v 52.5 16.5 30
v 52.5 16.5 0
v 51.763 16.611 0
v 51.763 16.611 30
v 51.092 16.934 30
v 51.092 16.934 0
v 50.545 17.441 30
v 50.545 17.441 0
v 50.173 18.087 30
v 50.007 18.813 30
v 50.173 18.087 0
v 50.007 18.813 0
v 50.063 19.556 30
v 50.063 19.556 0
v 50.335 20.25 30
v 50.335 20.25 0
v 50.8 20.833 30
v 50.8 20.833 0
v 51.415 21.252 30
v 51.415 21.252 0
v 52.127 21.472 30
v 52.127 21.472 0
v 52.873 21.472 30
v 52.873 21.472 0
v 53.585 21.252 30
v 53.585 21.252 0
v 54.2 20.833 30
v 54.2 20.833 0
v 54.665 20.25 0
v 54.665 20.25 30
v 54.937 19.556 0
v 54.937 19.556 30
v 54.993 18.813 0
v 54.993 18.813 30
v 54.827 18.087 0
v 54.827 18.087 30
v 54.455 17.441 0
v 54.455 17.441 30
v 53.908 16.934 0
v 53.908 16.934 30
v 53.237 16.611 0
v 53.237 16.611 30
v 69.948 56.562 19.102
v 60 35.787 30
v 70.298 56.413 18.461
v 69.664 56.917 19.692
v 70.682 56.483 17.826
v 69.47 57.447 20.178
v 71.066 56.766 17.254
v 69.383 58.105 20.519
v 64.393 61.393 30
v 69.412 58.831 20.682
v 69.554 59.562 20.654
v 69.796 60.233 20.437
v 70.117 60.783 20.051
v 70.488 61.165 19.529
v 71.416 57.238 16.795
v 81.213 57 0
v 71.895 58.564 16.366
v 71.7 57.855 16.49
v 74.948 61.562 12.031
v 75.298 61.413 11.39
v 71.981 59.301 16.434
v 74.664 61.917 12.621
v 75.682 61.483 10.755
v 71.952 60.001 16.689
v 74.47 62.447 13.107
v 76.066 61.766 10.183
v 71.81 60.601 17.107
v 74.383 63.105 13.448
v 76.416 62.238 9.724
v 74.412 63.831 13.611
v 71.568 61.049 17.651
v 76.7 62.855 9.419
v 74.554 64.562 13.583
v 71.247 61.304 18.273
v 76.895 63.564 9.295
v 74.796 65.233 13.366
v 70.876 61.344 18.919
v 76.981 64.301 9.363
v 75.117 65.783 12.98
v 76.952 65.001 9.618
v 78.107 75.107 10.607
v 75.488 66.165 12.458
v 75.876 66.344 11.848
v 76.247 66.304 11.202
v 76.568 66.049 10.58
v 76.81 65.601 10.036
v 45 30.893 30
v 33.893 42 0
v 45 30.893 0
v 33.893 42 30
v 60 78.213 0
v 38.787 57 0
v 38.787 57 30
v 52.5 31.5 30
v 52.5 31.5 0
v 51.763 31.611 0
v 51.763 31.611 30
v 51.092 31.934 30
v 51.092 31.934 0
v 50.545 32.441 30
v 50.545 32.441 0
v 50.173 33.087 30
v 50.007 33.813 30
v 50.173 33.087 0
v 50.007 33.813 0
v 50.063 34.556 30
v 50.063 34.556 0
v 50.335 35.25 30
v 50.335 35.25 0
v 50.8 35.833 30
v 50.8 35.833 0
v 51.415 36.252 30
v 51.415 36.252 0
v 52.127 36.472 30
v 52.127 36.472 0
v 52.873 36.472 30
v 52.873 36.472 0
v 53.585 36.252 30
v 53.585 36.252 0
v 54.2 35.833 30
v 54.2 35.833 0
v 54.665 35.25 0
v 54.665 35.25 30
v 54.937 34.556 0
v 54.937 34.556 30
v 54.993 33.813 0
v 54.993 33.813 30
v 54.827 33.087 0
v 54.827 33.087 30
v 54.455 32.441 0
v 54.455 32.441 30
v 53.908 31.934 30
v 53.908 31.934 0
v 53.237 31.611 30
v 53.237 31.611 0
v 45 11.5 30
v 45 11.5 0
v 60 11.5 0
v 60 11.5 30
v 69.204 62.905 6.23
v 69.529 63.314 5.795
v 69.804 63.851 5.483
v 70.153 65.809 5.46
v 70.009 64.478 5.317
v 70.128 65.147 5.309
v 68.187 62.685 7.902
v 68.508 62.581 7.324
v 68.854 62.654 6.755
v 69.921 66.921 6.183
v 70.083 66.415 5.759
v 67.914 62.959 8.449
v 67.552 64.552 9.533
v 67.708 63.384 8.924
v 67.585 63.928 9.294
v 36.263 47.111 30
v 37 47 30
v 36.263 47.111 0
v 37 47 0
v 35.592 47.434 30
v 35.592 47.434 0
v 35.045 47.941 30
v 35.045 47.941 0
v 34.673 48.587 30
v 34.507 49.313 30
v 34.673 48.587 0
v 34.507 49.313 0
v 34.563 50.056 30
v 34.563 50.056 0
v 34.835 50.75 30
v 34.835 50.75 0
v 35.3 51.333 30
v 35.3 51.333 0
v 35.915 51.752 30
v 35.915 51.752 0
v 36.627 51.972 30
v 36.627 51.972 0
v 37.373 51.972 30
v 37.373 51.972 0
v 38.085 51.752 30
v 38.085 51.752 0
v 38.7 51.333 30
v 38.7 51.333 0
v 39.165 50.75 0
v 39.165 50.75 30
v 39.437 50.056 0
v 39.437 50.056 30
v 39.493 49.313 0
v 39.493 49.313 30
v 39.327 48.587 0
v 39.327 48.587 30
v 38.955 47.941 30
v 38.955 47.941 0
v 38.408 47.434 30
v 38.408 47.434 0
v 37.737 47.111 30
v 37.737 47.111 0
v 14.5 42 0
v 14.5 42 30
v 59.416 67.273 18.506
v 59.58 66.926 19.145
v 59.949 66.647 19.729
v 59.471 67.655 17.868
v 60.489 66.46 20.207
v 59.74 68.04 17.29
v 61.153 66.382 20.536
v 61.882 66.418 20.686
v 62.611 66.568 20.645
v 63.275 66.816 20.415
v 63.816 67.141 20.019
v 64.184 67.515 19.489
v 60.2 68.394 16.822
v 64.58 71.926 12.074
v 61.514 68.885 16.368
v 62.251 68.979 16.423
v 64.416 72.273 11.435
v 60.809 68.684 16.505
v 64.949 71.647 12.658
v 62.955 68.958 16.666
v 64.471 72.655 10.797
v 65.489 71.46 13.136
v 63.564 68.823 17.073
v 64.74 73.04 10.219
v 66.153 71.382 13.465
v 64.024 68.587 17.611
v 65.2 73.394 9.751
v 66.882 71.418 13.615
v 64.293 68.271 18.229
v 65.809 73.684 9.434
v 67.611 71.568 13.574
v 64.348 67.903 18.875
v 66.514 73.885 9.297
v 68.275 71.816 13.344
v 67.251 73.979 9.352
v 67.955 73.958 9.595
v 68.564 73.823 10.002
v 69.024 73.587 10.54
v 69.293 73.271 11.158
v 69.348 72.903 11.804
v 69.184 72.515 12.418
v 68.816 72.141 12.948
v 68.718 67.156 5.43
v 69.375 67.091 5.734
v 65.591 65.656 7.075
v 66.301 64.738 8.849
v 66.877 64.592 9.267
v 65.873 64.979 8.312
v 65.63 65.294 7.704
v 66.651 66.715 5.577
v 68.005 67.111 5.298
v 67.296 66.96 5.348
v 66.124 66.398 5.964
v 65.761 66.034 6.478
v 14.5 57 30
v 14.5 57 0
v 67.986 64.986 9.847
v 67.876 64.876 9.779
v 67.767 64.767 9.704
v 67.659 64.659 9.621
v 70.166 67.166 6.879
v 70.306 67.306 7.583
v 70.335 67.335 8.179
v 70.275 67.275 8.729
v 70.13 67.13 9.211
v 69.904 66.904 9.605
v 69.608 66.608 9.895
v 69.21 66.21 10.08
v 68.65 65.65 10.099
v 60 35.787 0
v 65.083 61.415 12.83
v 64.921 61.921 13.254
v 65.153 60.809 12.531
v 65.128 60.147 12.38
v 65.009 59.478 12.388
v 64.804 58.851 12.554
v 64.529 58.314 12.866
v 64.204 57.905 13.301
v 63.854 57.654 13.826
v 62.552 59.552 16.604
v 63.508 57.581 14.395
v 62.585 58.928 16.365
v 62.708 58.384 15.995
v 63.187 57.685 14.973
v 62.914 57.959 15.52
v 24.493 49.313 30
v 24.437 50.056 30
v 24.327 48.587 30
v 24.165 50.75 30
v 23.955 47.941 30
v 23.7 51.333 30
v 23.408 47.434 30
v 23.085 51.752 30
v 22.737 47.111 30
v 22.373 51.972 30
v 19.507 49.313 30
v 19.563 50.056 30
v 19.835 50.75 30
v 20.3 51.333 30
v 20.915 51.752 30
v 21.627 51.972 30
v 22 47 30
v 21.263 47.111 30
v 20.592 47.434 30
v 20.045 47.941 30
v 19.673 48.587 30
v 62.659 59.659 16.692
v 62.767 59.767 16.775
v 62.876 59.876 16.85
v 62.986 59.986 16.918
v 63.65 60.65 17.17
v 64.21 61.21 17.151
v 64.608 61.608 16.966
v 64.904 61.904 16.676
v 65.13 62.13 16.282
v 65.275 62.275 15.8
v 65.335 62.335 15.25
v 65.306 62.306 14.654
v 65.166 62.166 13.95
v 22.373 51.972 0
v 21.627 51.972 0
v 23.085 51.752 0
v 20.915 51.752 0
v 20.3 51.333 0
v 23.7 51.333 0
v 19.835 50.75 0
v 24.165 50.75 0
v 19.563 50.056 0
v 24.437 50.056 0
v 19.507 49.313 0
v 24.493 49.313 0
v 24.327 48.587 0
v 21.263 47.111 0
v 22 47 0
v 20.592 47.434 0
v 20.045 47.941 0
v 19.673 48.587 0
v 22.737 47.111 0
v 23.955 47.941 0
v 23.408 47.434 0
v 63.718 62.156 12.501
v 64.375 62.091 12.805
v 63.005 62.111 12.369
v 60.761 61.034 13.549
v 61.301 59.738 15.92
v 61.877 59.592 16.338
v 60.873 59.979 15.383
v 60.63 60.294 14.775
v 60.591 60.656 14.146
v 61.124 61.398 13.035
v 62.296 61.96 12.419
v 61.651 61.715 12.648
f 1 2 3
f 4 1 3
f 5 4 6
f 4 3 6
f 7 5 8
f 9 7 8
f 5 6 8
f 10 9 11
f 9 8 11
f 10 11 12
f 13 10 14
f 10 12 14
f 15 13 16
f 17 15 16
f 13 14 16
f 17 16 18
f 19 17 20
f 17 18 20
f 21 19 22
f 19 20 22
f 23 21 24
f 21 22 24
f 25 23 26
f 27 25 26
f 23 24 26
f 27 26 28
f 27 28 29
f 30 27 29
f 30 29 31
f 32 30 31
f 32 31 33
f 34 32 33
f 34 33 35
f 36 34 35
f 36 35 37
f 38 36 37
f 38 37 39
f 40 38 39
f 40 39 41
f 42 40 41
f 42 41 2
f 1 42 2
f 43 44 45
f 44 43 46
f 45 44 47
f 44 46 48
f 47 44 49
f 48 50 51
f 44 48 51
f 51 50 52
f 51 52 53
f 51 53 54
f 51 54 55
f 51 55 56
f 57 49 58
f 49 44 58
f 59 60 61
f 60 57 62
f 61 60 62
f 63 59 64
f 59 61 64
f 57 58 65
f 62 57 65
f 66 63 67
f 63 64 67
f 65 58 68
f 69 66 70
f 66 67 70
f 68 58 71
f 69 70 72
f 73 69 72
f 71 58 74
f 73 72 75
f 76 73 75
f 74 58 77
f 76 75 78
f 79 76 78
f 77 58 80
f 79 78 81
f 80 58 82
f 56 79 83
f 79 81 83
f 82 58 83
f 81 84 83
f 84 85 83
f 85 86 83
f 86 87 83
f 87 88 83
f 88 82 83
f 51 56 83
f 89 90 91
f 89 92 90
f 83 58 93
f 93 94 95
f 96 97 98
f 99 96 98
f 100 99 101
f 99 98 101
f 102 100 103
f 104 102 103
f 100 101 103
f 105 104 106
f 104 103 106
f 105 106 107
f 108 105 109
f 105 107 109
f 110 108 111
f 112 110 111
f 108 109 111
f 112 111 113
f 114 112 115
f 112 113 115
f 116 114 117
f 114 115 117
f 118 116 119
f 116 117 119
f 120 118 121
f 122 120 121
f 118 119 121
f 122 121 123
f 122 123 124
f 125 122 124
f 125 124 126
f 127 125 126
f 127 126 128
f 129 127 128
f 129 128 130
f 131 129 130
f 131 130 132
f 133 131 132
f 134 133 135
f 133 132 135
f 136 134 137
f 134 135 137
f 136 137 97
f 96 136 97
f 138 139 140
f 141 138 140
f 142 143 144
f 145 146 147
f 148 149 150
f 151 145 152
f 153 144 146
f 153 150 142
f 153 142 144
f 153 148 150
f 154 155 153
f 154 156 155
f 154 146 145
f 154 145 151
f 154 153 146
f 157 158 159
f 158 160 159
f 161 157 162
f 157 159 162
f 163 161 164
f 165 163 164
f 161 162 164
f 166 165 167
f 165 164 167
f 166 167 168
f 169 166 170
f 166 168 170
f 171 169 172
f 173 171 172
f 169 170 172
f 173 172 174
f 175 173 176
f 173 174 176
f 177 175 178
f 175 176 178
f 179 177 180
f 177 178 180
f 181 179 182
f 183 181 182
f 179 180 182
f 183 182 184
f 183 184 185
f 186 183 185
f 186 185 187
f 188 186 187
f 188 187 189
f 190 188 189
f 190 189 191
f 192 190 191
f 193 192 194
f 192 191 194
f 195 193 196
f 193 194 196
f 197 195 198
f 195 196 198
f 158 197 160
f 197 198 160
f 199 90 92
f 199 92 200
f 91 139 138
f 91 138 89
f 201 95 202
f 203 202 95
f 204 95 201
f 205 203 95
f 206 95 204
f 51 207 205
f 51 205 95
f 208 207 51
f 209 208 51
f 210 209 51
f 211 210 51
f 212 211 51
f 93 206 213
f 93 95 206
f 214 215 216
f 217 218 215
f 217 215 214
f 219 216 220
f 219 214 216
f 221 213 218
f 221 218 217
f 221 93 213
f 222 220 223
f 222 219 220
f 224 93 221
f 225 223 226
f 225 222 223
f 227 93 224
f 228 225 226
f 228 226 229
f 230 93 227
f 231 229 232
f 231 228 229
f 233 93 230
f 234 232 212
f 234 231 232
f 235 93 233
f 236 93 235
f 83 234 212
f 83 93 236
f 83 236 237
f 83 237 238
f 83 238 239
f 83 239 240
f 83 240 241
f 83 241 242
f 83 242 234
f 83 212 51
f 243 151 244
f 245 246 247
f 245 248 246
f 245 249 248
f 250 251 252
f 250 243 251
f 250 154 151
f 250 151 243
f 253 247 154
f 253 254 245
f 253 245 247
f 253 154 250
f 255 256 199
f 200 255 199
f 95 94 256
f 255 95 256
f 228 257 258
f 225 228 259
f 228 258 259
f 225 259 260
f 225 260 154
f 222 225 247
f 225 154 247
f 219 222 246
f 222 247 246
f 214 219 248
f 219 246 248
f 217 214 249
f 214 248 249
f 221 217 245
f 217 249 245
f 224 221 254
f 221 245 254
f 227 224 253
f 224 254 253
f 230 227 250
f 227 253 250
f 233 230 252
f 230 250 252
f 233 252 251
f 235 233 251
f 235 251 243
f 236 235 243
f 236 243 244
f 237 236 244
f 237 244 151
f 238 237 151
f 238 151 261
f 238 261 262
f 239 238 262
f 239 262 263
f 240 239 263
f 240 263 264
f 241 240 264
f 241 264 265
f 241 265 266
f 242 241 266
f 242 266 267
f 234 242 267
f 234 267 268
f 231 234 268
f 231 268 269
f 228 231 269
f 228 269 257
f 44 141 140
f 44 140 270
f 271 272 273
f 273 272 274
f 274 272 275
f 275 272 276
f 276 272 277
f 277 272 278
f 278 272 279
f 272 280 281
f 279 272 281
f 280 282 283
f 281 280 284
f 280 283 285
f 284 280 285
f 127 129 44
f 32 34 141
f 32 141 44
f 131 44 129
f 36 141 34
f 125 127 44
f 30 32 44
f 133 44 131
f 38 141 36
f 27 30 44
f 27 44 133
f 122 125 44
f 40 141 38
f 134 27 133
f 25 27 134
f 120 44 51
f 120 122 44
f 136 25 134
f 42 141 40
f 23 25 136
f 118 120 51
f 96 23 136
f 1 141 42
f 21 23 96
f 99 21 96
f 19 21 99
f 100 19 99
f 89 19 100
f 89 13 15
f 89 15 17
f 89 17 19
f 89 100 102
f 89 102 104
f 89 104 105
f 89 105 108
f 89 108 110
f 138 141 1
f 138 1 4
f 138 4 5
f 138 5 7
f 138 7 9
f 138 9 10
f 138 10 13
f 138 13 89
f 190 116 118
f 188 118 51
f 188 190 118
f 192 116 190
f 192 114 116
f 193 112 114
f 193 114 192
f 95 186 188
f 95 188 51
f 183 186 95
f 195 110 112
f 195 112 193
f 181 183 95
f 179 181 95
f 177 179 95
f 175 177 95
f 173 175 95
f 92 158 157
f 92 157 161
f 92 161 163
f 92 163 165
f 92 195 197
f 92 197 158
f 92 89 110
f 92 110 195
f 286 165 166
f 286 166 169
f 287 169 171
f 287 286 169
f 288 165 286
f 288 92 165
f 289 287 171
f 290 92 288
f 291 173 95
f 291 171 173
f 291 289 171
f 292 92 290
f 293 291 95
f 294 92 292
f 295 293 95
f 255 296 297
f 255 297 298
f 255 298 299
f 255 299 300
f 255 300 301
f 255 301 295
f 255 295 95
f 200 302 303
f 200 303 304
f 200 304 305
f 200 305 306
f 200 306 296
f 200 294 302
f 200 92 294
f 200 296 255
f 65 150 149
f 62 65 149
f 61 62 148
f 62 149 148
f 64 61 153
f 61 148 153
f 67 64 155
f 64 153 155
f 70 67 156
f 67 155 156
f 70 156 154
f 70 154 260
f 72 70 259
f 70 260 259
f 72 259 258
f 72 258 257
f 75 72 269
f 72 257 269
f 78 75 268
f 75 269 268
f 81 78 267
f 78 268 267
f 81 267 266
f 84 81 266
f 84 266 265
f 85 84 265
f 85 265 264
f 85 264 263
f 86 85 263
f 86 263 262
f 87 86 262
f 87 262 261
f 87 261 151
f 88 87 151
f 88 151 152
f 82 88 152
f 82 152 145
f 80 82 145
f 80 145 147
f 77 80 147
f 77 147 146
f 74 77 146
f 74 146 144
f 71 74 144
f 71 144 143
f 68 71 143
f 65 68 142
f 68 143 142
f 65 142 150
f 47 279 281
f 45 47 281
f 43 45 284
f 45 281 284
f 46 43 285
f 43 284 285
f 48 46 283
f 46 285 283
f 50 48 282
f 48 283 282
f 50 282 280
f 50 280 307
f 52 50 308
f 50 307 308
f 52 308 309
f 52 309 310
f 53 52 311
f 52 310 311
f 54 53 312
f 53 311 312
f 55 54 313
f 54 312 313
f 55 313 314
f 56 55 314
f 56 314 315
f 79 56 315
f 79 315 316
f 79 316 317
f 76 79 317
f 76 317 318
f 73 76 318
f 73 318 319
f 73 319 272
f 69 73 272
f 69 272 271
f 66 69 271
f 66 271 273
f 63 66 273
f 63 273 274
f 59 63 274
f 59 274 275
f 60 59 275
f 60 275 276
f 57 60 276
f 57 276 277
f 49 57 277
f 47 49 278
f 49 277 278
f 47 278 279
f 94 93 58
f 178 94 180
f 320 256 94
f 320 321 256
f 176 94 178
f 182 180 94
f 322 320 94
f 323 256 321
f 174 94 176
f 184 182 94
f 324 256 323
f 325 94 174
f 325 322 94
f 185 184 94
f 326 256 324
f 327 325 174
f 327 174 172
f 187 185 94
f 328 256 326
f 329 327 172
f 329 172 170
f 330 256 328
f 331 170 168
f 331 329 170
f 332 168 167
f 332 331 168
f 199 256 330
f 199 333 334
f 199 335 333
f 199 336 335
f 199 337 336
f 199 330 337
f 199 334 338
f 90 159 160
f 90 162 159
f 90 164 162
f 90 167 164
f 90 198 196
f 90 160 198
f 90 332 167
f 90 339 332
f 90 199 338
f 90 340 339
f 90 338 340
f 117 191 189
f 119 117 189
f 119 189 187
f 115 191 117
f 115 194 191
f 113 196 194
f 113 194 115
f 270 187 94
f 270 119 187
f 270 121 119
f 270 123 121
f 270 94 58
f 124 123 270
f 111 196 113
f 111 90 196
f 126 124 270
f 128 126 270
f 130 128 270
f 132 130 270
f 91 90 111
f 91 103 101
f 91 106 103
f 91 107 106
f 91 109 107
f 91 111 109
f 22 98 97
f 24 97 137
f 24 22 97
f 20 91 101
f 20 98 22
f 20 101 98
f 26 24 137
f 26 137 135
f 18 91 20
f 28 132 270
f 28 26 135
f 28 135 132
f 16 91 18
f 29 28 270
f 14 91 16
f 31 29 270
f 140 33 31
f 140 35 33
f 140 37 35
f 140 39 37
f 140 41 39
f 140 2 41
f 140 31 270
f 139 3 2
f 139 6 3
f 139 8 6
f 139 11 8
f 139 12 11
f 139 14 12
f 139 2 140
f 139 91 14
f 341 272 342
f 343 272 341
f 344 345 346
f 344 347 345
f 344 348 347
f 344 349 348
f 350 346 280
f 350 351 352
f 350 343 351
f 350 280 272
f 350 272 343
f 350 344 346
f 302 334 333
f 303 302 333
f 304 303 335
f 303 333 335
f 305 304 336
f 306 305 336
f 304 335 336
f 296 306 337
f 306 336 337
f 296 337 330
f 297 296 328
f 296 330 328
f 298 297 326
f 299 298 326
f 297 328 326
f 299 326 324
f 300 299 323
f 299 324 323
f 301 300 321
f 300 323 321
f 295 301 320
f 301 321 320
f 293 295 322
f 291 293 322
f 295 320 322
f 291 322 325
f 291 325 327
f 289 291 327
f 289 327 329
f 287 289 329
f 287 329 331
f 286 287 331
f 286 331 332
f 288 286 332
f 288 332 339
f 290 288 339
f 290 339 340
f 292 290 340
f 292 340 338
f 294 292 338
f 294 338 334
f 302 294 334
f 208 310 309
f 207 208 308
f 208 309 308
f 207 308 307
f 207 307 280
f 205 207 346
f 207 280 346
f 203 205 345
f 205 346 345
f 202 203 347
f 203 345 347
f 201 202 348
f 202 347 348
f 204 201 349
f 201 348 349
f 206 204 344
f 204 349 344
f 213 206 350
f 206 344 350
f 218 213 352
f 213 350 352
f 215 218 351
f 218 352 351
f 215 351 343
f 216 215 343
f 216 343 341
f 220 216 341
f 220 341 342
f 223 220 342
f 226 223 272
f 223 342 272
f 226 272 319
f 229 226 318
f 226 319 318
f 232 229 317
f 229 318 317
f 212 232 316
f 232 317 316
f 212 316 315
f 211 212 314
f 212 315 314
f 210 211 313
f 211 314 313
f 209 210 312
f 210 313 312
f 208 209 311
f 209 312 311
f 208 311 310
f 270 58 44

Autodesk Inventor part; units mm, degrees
ref_plane "YZ Plane" through (0, 0, 0) normal (1, 0, 0) x (0, 1, 0)
ref_plane "XZ Plane" through (0, 0, 0) normal (0, 1, 0) x (-1, 0, 0)
ref_plane "XY Plane" through (0, 0, 0) normal (0, 0, 1) x (1, 0, 0)
sketch "スケッチ1" plane through (0, 0, 0) normal (0, 0, 1) x (1, 0, 0)
  line L0 (0, 0) -> (60, 0)
  line L1 (60, 0) -> (60, 60)
  line L2 (60, 60) -> (0, 60)
  line L3 (0, 60) -> (0, 0)
  dimension "d0" = 60
  dimension "d1" = 60
extrude "押し出し1" add sketch "スケッチ1" along normal blind 30
sketch "スケッチ2" plane through (0, 0, 30) normal (0, 0, 1) x (1, 0, 0)
  line L0 (60, 0) -> (60, 60) projected
  line L1 (60, 60) -> (0, 60) projected
  point P0 (0, 0)
  point P1 (22, 49.5)
  point P2 (37, 49.5)
  point P3 (52.5, 34)
  point P4 (52.5, 19)
  dimension "d4" = 7.5
  dimension "d5" = 7.5
  dimension "d6" = 10.5
  dimension "d7" = 10.5
  dimension "d8" = 15
  dimension "d9" = 15
  dimension "d10" = 23
  dimension "d11" = 26
hole "穴1" at (22, 49.5, 30) at (37, 49.5, 30) at (52.5, 34, 30) at (52.5, 19, 30) direction (0, 0, -1) diameter 5 end through all
sketch "スケッチ3" plane through (0, 0, 30) normal (0, 0, 1) x (1, 0, 0)
  line L0 (22, 49.5) -> (37, 49.5)
  circle A0 centre (52.5, 34) radius 2.5 projected
  line L1 (37, 49.5) -> (52.5, 34)
  line L2 (52.5, 34) -> (52.5, 19)
  line L3 (22, 49.5) -> (22, 19)
  line L4 (22, 19) -> (52.5, 19)
  line L5 (60, 37.1066) -> (40.1066, 57)
  line L6 (40.1066, 57) -> (14.5, 57)
  line L7 (14.5, 57) -> (14.5, 11.5)
  line L8 (14.5, 11.5) -> (60, 11.5)
  line L9 (60, 11.5) -> (60, 37.1066)
  line L10 (14.5, 57) -> (44.5, 57)
  line L11 (44.5, 57) -> (44.5, 42)
  line L12 (44.5, 42) -> (14.5, 42)
  line L13 (14.5, 42) -> (14.5, 57)
  line L14 (60, 11.5) -> (45, 11.5)
  line L15 (45, 11.5) -> (45, 41.5)
  line L16 (45, 41.5) -> (60, 41.5)
  line L17 (60, 41.5) -> (60, 11.5)
  circle A1 centre (52.5, 19) radius 2.5 projected
  circle A2 centre (52.5, 34) radius 2.5 projected
  circle A3 centre (37, 49.5) radius 2.5 projected
  circle A4 centre (22, 49.5) radius 2.5 projected
  line L18 (60, 0) -> (60, 60) projected
  line L19 (60, 60) -> (0, 60) projected
  line L20 (0, 60) -> (0, 0) projected
  line L21 (0, 0) -> (60, 0) projected
  line L22 (14.5, 42) -> (45, 11.5)
  line L23 (24.0029, 51.8905) -> (54.5029, 21.3905)
  line L24 (38.7868, 57) -> (60, 35.7868)
  point P0 (52.5, 26.5)
  point P1 (45, 19)
  point P2 (22, 42)
  point P3 (39.2529, 36.6405)
  point P4 (45, 30.8934)
  point P5 (33.8934, 42)
  dimension "d19" = 7.5
  dimension "d20" = 7.5
  dimension "d21" = 7.5
  dimension "d22" = 30
  dimension "d23" = 30
  dimension "d50" = 7.5
  dimension "d52" = 30
extrude "押し出し2" cut sketch "スケッチ3" against normal blind 30 contours L12 L23 L15 L4 L22 L3 | L3 L22 L12 | L22 L4 L3 | L3 L4 L22 L8 L7 | L7 L8 L18 L21 L20 L19 L16 L5 L11 L10 L6 | L4 L15 L22 | L24 L6 L5 L11 | L11 L5 L16 L24 | L16 L5 L9 L24 | L5 L10 L11 | L16 L17 L5
sketch "スケッチ15" plane through (60, 35.7868, 0) normal (0.7071068, 0.7071068, 0) x (-0.7071068, 0.7071068, 0)
  line L0 (0, 30) -> (30, 30) projected
  line L1 (0, 0) -> (0, 30) projected
  line L2 (30, 0) -> (0, 0) projected
  line L3 (30, 30) -> (30, 0) projected
  point P0 (17.1213, 0)
extrude "押し出し11" add sketch "スケッチ15" along normal blind 30
sketch "スケッチ16" plane through (60, 35.7868, 30) normal (0.7071068, -0.7071068, 0) x (-0.7071068, -0.7071068, 0)
  line L0 (0, 30) -> (0, 0) projected
  line L1 (0, 30) -> (-30, 30) projected
  line L2 (-30, 0) -> (-30, 30) projected
  line L3 (0, 0) -> (-30, 0) projected
  line L4 (0, 0) -> (-30, 30)
  point P0 (67.7315, 30)
extrude "押し出し12" cut sketch "スケッチ16" against normal blind 30 contours L3 L2 L4
sketch "スケッチ18" plane through (60, 35.7868, 30) normal (0.5, 0.5, 0.7071068) x (0.7071068, -0.7071068, 0)
  line L0 (0, 42.4264) -> (0, 0) projected
  line L1 (0, 42.4264) -> (-30, 42.4264) projected
  line L2 (-30, 0) -> (-30, 42.4264) projected
  line L3 (0, 0) -> (-30, 0) projected
  point P0 (-17.1213, -26.6802)
extrude "押し出し13" add sketch "スケッチ18" along normal blind 30
sketch "スケッチ19" plane through (81.2132, 57, 0) normal (0.5, 0.5, -0.7071068) x (-0.5, -0.5, -0.7071068)
  line L0 (21.2132, 0) -> (0, 0) projected
  line L1 (0, 30) -> (-30, 30) projected
  line L2 (0, 0) -> (-30, 30)
  line L3 (-30, 30) -> (0, 30)
  line L4 (0, 0) -> (-30, 0) projected
  line L5 (0, 30) -> (-30, 0)
  line L6 (0, 0) -> (0, 30) projected
  line L7 (0, 30) -> (-30, 30) projected
  line L8 (-30, 0) -> (-30, 30) projected
  line L9 (0, 0) -> (-30, 0) projected
  point P0 (69.1066, 17.1213)
  point P1 (-15, 15)
extrude "押し出し14" cut sketch "スケッチ19" against normal through all contours L5 L2 L1 | L2 L5 L8 | L2 L4 L5
sketch "スケッチ20" plane through (0, 0, 30) normal (0, 0, 1) x (1, 0, 0)
  circle A0 centre (52.5, 19) radius 2.5 projected
  circle A1 centre (52.5, 34) radius 2.5 projected
  circle A2 centre (37, 49.5) radius 2.5 projected
  circle A3 centre (22, 49.5) radius 2.5 projected
  line L0 (60, 35.7868) -> (38.7868, 57) projected
  line L1 (38.7868, 57) -> (14.5, 57) projected
  line L2 (14.5, 57) -> (14.5, 42) projected
  line L3 (14.5, 42) -> (33.8934, 42) projected
  line L4 (33.8934, 42) -> (45, 30.8934) projected
  line L5 (45, 30.8934) -> (45, 11.5) projected
  line L6 (45, 11.5) -> (60, 11.5) projected
  line L7 (60, 11.5) -> (60, 35.7868) projected
  line L8 (38.7868, 57) -> (60, 78.2132) projected
  line L9 (38.7868, 57) -> (60, 78.2132)
  line L10 (60, 78.2132) -> (81.2132, 57)
  line L11 (81.2132, 57) -> (60, 35.7868)
  point P0 (0, 0)
extrude "押し出し15" cut sketch "スケッチ20" along normal blind 15 contours L0 L8 L10 L11
sketch "スケッチ23" plane through (81.2132, 57, 0) normal (0.8535534, -0.1464466, 0.5) x (0.5, 0.5, -0.7071068)
  line L0 (0, 21.2132) -> (0, 0) projected
  line L1 (-27.4264, 21.2132) -> (-42.4264, 0) projected
  line L2 (0, 0) -> (-27.4264, 0)
  line L3 (-27.4264, 0) -> (-27.4264, 21.2132)
  line L4 (-27.4264, 21.2132) -> (0, 21.2132)
  line L5 (0, 21.2132) -> (0, 0)
  point P0 (-69.1066, -36.7591)
  point P1 (-17.4264, 12.4132)
  point P2 (-7.4264, 12.4132)
  dimension "d71" = 10
  dimension "d72" = 10
  dimension "d93" = 8.8
  dimension "d94" = 8.8
hole "穴2" at (70.6821, 58.8821, 18.5289) at (75.6821, 63.8821, 11.4579) direction (-0.8535534, 0.1464466, -0.5) diameter 5 depth 8
sketch "スケッチ24" plane through (60, 78.2132, 0) normal (-0.1464466, 0.8535534, 0.5) x (0.8535534, -0.1464466, 0.5)
  line L0 (21.2132, -27.4264) -> (21.2132, -42.4264) projected
  line L1 (-15, -21.2132) -> (0, 0) projected
  line L2 (21.2132, -27.4264) -> (0, -27.4264)
  line L3 (0, -27.4264) -> (0, 0)
  line L4 (0, 0) -> (21.2132, 0)
  line L5 (21.2132, 0) -> (21.2132, -27.4264)
  point P0 (-39.7591, -69.1066)
  point P1 (12.4132, -17.4264)
  point P2 (12.4132, -7.4264)
  dimension "d82" = 10
  dimension "d83" = 10
  dimension "d95" = 8.8
  dimension "d96" = 8.8
hole "穴3" at (61.8821, 67.6821, 18.5289) at (66.8821, 72.6821, 11.4579) direction (0.1464466, -0.8535534, -0.5) diameter 5 depth 8
equation "\"d5\" = d4"
equation "\"d7\" = d6"
equation "\"d9\" = d8"
equation "\"d20\" = d19"
equation "\"d21\" = d20"
equation "\"d23\" = d22"
equation "\"d94\" = d93"
equation "\"d83\" = d82"
equation "\"d96\" = d95"
properties part number "EX-L-Connect"
